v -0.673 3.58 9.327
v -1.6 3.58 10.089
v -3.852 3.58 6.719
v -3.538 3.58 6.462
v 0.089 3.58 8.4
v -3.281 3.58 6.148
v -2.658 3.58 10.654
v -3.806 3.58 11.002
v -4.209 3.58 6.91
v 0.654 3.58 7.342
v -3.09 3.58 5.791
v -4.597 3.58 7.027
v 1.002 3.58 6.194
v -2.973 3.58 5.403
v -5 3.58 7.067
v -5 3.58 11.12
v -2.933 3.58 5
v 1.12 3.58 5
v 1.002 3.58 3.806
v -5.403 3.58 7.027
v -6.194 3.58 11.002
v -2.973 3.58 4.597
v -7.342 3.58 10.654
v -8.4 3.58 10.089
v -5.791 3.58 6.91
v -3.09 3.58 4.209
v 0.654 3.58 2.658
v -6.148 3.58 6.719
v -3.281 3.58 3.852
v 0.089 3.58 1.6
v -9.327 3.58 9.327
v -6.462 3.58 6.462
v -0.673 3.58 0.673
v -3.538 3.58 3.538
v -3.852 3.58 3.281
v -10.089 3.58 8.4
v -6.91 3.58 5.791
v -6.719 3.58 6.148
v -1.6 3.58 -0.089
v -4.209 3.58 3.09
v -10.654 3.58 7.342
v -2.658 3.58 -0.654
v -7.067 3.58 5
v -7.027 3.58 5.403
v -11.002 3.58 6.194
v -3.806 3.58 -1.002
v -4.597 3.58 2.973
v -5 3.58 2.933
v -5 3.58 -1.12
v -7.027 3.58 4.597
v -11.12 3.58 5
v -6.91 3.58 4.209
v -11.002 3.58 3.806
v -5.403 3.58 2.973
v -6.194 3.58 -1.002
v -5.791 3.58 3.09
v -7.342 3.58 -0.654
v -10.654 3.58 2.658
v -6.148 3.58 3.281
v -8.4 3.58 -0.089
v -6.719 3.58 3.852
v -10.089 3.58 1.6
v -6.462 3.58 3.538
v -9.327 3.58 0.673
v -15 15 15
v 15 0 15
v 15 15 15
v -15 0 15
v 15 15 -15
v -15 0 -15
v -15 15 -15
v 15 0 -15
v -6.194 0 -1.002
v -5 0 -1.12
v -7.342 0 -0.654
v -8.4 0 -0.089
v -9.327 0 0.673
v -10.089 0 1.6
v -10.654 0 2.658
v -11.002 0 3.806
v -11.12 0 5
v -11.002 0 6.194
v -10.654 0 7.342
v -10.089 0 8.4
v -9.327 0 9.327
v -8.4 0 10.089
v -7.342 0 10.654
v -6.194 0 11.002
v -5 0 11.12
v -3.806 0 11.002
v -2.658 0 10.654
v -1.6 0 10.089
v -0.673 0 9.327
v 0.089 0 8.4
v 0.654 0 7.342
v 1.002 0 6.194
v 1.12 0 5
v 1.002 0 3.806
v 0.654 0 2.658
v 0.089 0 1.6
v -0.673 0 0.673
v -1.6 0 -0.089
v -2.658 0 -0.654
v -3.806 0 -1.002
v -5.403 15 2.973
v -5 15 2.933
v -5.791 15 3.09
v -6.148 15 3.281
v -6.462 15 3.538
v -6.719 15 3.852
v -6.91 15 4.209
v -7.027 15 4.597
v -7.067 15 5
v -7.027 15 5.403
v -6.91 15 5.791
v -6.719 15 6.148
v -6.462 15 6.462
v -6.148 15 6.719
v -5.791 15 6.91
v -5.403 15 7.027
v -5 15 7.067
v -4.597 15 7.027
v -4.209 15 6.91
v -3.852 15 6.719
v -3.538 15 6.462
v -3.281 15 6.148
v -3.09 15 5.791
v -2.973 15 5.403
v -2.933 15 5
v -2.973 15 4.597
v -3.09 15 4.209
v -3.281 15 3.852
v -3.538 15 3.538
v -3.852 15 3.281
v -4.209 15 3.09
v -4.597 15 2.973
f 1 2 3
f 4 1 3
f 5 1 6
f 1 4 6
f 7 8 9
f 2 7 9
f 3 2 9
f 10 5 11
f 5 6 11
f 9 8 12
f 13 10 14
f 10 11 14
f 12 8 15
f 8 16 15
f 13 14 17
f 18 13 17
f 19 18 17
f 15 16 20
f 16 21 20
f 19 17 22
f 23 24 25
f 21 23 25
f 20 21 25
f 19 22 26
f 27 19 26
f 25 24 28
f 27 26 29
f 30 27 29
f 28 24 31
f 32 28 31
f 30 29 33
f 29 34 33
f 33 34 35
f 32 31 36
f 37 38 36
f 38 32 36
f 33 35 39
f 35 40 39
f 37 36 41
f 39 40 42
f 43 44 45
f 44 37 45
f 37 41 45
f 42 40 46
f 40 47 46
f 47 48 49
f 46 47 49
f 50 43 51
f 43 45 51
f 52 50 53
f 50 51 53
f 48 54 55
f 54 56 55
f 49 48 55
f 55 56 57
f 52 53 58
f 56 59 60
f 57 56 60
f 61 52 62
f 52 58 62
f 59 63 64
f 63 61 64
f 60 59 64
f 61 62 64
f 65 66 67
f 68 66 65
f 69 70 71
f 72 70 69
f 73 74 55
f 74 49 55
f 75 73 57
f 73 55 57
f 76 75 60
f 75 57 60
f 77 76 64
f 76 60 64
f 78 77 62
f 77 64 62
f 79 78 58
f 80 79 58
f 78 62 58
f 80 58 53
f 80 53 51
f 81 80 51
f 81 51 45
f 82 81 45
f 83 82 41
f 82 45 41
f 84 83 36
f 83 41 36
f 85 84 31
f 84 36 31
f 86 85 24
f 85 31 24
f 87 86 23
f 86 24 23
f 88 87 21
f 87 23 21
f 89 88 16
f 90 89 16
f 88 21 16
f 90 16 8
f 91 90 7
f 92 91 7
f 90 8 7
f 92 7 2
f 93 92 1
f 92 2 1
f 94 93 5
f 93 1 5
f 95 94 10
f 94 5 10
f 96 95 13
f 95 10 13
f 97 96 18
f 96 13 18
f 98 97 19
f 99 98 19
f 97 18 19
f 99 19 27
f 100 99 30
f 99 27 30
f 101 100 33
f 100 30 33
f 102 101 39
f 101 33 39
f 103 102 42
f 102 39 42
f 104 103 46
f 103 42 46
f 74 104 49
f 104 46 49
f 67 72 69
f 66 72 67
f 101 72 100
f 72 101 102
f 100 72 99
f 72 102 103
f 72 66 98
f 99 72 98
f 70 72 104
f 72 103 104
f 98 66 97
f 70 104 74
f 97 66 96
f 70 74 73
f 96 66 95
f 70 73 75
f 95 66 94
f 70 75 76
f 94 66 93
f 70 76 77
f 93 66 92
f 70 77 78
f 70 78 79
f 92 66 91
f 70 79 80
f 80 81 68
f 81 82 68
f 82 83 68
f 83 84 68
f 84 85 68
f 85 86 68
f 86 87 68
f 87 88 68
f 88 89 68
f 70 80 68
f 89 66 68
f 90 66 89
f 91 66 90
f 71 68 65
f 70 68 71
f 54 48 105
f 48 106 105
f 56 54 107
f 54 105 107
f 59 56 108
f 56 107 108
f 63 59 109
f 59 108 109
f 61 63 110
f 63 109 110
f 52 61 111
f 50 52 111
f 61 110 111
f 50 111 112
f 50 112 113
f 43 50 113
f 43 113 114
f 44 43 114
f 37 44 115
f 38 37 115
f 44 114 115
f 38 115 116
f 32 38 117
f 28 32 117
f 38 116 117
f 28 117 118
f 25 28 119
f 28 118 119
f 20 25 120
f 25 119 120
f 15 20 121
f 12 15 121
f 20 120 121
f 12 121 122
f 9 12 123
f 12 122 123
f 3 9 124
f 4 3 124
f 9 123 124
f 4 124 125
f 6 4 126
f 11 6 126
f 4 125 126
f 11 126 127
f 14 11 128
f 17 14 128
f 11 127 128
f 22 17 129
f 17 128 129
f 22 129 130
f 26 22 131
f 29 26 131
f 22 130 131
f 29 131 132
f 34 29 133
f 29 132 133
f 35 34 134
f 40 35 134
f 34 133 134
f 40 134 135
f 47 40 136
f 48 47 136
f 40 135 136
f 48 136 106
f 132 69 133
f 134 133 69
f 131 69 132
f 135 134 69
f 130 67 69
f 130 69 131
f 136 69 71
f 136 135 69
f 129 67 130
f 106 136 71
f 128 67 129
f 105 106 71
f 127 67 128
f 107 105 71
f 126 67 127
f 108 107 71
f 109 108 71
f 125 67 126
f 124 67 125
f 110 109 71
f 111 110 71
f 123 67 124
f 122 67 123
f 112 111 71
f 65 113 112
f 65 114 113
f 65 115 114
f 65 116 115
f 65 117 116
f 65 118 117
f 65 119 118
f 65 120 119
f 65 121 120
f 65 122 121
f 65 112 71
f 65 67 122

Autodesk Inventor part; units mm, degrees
ref_plane "YZ Plane" through (0, 0, 0) normal (1, 0, 0) x (0, 1, 0)
ref_plane "XZ Plane" through (0, 0, 0) normal (0, 1, 0) x (-1, 0, 0)
ref_plane "XY Plane" through (0, 0, 0) normal (0, 0, 1) x (1, 0, 0)
sketch "Sketch1" plane through (0, 0, 0) normal (0, 1, 0) x (-1, 0, 0)
  line L0 (15, -15) -> (-15, -15)
  line L1 (-15, -15) -> (-15, 15)
  line L2 (-15, 15) -> (15, 15)
  line L3 (15, 15) -> (15, -15)
  line L4 (15, -15) -> (-15, 15) construction
  line L5 (-15, -15) -> (15, 15) construction
  point P0 (0, 0)
  point P1 (5, 5)
  dimension "d0" = 30
  dimension "d1" = 30
  dimension "d2" = 10
  dimension "d3" = 10
extrude "Extrusion1" add sketch "Sketch1" along normal blind 15
hole "Hole1" at (-5, 0, 5) direction (0, 1, 0) diameter 4.134 end through all counterbore diameter 12.24 counterbore depth 3.58 thread size "M5x0.8" class "6H" standard "ANSI Metric M Profile"
properties part number "Soporte_Base_Madera" material "PC/ABS Plastic"
